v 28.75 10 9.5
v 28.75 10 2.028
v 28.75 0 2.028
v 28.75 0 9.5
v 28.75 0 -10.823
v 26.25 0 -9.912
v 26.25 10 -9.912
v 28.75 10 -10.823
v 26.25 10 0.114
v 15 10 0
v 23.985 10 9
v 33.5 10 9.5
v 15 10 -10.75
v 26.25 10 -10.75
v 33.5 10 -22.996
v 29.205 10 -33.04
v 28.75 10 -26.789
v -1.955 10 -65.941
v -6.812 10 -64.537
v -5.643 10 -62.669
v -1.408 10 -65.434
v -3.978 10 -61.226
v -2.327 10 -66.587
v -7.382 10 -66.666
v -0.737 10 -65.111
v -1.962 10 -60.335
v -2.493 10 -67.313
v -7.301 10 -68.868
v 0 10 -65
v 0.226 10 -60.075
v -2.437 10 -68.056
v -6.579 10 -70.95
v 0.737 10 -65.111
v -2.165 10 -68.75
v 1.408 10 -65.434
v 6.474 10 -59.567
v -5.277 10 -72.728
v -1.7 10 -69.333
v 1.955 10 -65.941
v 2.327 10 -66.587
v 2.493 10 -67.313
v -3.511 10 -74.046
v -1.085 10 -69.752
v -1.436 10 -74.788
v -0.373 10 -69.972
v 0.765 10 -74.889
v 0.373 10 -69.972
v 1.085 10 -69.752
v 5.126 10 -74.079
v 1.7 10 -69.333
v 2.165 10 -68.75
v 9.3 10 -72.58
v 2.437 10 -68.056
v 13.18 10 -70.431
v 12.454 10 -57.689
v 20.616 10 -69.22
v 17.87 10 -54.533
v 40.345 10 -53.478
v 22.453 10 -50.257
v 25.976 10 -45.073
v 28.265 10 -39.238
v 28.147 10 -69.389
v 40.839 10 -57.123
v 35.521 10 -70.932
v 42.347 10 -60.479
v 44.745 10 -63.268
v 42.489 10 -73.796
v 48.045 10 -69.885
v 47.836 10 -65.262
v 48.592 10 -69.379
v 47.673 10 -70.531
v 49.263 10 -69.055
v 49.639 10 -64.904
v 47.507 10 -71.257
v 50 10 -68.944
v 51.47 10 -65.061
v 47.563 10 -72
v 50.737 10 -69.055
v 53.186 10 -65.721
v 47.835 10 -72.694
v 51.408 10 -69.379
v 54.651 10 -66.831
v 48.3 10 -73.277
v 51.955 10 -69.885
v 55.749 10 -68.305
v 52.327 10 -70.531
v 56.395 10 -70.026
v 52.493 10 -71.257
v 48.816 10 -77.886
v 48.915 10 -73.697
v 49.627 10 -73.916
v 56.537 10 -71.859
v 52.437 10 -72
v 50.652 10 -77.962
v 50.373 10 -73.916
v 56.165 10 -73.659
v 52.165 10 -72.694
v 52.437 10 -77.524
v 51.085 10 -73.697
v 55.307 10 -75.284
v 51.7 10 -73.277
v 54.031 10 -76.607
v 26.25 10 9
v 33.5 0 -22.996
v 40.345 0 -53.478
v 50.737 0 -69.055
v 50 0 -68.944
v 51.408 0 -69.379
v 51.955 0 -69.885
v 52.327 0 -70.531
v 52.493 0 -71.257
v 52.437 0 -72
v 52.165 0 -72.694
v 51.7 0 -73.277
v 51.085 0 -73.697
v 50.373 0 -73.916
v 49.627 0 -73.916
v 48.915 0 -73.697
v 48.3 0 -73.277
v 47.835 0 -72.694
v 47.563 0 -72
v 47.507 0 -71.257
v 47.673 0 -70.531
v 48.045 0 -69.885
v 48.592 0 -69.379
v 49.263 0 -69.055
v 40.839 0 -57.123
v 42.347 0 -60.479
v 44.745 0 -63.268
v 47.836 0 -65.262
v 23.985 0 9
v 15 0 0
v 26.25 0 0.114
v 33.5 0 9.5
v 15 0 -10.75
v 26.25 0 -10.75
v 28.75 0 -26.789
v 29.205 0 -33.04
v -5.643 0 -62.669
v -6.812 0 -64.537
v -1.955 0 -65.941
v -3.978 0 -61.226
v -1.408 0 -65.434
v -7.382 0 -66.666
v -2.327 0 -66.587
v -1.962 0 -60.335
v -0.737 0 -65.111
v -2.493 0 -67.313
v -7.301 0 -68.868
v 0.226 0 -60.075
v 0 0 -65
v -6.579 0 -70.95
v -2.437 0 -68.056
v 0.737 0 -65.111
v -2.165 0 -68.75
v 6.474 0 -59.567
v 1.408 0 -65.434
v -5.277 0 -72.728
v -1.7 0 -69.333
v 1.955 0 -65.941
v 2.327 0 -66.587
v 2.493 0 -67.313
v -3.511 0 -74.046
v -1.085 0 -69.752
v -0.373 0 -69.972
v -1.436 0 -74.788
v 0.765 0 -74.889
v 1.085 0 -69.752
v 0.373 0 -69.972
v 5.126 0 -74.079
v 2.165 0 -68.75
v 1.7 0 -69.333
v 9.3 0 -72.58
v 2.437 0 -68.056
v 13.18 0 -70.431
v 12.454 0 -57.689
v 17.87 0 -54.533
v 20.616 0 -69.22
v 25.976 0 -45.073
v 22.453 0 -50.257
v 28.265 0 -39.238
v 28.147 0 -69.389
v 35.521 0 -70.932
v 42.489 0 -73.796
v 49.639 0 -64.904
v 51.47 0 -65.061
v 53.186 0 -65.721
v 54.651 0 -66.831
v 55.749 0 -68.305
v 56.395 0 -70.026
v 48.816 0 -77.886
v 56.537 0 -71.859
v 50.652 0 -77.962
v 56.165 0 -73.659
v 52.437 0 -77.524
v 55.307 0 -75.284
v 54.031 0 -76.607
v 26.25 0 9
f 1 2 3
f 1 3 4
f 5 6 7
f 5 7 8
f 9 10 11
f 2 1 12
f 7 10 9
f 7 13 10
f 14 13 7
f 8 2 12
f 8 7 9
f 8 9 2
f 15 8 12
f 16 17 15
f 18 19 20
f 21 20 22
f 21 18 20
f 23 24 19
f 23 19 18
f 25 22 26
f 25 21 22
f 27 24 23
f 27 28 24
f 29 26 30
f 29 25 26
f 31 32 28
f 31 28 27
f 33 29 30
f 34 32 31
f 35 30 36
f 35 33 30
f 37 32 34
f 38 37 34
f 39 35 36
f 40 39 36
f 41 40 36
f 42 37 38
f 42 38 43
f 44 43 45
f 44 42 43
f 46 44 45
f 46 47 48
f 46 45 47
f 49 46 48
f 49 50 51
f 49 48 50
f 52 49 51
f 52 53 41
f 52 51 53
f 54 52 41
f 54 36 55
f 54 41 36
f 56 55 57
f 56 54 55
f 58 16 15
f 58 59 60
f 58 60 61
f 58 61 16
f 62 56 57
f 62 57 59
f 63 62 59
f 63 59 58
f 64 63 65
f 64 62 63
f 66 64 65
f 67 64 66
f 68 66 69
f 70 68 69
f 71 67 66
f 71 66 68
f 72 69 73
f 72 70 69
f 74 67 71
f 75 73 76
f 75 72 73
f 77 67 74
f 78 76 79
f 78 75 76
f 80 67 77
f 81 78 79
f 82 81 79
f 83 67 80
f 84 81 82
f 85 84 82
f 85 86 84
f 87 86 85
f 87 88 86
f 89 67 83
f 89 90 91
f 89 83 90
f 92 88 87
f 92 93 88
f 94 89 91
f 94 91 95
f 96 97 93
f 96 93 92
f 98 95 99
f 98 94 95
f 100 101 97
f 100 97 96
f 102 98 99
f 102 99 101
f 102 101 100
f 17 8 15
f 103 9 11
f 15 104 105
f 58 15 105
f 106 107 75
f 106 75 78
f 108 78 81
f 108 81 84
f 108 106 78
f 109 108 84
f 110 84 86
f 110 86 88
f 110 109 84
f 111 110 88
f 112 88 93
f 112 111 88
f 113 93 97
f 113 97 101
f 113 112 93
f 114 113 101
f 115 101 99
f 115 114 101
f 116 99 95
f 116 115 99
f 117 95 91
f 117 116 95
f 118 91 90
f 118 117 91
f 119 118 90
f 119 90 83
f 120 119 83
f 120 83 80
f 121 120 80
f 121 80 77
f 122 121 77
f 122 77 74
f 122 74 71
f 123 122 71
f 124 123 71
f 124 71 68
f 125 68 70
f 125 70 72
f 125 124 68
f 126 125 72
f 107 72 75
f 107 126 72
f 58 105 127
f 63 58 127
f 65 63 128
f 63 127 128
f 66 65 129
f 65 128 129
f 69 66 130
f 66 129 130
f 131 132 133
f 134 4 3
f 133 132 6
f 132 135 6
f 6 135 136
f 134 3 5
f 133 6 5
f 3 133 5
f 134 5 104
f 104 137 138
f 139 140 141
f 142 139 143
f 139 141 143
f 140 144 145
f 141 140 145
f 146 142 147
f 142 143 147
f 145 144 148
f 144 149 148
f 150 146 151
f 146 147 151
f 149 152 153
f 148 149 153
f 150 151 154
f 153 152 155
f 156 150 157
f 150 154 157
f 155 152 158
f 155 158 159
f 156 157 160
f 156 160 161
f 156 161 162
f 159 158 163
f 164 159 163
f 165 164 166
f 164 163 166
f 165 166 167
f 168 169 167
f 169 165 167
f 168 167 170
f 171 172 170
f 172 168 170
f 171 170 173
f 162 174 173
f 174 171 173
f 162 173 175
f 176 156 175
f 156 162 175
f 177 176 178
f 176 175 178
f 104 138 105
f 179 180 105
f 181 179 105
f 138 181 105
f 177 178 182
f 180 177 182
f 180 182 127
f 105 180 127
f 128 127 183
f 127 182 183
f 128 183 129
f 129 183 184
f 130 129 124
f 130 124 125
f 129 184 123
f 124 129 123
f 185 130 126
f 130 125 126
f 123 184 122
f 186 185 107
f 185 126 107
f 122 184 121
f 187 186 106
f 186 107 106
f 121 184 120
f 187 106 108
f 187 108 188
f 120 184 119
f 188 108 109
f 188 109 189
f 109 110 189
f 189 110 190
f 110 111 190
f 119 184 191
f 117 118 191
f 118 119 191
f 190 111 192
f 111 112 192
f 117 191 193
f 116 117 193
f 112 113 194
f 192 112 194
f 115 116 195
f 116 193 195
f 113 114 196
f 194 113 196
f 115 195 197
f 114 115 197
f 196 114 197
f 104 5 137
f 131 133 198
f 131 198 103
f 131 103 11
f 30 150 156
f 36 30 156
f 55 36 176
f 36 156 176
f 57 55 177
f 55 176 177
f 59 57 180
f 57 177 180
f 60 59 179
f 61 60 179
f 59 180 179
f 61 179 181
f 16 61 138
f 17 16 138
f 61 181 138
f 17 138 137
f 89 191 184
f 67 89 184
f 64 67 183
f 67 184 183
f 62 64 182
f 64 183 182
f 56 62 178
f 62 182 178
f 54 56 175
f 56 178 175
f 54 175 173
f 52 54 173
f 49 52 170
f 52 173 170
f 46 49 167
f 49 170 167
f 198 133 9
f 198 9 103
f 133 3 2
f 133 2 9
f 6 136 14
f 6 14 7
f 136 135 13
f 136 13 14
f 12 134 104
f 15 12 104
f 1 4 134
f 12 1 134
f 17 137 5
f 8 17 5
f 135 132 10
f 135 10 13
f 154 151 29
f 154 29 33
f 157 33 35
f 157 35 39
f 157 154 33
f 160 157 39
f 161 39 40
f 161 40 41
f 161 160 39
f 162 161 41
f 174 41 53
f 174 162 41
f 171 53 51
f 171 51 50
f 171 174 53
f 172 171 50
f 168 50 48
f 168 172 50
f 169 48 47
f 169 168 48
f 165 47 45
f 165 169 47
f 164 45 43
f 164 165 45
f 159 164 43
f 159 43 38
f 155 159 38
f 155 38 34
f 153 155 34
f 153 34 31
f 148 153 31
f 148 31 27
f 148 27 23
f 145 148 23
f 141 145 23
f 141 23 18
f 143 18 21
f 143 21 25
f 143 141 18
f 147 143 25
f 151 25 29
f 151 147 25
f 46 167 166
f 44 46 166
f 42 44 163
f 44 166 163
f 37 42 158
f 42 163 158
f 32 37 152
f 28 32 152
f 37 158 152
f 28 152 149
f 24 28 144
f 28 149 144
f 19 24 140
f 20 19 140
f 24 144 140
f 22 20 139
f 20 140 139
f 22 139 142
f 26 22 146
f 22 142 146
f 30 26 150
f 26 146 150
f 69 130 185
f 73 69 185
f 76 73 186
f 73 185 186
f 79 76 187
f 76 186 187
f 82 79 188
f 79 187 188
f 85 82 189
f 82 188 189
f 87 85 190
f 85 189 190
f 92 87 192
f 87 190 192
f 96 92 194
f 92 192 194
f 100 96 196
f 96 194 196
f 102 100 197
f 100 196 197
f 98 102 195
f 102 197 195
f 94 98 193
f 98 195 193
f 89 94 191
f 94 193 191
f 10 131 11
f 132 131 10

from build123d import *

# Parameters (mm, degrees)
BOSS_EXTRUDE2_DEPTH   = 10
BOSS_EXTRUDE2_2_DEPTH = 10
SKETCH4_R             = 2.5
BOSS_EXTRUDE3_DEPTH   = 10
SKETCH8_R             = 22.839298689
CUT_EXTRUDE1_DEPTH    = 10


with BuildPart() as part:
    # Sketch1 → Boss-Extrude2 (new body)
    with BuildSketch(Plane(origin=(0, 0, 0), x_dir=(1, 0, 0), z_dir=(0, 1, 0))):
        Polygon((-26.25, 10.75), (-15, 10.75), (-15, 0), (-23.984756923, -9), (-26.25, -9), (-26.25, -0.114272299), (-29.438415679, -2.555067389), (-29.438415679, 11.073293435), (-26.25, 9.911985917), align=None)
    extrude(amount=BOSS_EXTRUDE2_DEPTH)

    # Sketch8 → Cut-Extrude1 (cut)
    with BuildSketch(Plane(origin=(0, 0, 0), x_dir=(1, 0, 0), z_dir=(0, 1, 0))):
        with Locations((-20.905433381, 4.192616326)):
            Circle(SKETCH8_R)
    extrude(amount=CUT_EXTRUDE1_DEPTH, mode=Mode.SUBTRACT)


with BuildPart() as body_2:
    # Sketch1 → Boss-Extrude2 2 (new body)
    with BuildSketch(Plane(origin=(0, 0, 0), x_dir=(1, 0, 0), z_dir=(0, 1, 0))):
        Polygon((26.25, 10.75), (26.25, 9.911985917), (29.438415679, 11.073293435), (29.438415679, -2.555067389), (26.25, -0.114272299), (26.25, -9), (23.984756923, -9), (15, 0), (15, 10.75), align=None)
    extrude(amount=BOSS_EXTRUDE2_2_DEPTH)

    # Sketch4 → Boss-Extrude3 (add)
    with BuildSketch(Plane(origin=(0, 0, 0), x_dir=(1, 0, 0), z_dir=(0, 1, 0))):
        with BuildLine():
            Line((28.75, -9.5), (33.5, -9.5))
            Line((33.5, -9.5), (33.5, 22.996479512))
            Line((33.5, 22.996479512), (40.345191882, 53.478179684))
            ThreePointArc((40.345191882, 53.478179684), (42.346706654, 60.478565285), (47.83611753, 65.261642557))
            ThreePointArc((47.83611753, 65.261642557), (56.530633029, 70.937419635), (48.815741717, 77.886484122))
            ThreePointArc((48.815741717, 77.886484122), (31.869937483, 69.990732218), (13.180106847, 70.430516322))
            ThreePointArc((13.180106847, 70.430516322), (7.243272391, 73.413222616), (0.765261217, 74.88899747))
            ThreePointArc((0.765261217, 74.88899747), (-7.423605548, 67.770164785), (0.226137573, 60.074922886))
            ThreePointArc((0.226137573, 60.074922886), (22.453224616, 50.257390562), (28.75, 26.78873148))
            Line((28.75, 26.78873148), (28.75, -9.5))
        make_face()
        with Locations(Location((0, 67.5, 0), (0, 0, 270))):
            Circle(SKETCH4_R, mode=Mode.SUBTRACT)
        with Locations(Location((50, 71.444163901, 0), (0, 0, 270))):
            Circle(SKETCH4_R, mode=Mode.SUBTRACT)
    extrude(amount=BOSS_EXTRUDE3_DEPTH)


solid = body_2.part
